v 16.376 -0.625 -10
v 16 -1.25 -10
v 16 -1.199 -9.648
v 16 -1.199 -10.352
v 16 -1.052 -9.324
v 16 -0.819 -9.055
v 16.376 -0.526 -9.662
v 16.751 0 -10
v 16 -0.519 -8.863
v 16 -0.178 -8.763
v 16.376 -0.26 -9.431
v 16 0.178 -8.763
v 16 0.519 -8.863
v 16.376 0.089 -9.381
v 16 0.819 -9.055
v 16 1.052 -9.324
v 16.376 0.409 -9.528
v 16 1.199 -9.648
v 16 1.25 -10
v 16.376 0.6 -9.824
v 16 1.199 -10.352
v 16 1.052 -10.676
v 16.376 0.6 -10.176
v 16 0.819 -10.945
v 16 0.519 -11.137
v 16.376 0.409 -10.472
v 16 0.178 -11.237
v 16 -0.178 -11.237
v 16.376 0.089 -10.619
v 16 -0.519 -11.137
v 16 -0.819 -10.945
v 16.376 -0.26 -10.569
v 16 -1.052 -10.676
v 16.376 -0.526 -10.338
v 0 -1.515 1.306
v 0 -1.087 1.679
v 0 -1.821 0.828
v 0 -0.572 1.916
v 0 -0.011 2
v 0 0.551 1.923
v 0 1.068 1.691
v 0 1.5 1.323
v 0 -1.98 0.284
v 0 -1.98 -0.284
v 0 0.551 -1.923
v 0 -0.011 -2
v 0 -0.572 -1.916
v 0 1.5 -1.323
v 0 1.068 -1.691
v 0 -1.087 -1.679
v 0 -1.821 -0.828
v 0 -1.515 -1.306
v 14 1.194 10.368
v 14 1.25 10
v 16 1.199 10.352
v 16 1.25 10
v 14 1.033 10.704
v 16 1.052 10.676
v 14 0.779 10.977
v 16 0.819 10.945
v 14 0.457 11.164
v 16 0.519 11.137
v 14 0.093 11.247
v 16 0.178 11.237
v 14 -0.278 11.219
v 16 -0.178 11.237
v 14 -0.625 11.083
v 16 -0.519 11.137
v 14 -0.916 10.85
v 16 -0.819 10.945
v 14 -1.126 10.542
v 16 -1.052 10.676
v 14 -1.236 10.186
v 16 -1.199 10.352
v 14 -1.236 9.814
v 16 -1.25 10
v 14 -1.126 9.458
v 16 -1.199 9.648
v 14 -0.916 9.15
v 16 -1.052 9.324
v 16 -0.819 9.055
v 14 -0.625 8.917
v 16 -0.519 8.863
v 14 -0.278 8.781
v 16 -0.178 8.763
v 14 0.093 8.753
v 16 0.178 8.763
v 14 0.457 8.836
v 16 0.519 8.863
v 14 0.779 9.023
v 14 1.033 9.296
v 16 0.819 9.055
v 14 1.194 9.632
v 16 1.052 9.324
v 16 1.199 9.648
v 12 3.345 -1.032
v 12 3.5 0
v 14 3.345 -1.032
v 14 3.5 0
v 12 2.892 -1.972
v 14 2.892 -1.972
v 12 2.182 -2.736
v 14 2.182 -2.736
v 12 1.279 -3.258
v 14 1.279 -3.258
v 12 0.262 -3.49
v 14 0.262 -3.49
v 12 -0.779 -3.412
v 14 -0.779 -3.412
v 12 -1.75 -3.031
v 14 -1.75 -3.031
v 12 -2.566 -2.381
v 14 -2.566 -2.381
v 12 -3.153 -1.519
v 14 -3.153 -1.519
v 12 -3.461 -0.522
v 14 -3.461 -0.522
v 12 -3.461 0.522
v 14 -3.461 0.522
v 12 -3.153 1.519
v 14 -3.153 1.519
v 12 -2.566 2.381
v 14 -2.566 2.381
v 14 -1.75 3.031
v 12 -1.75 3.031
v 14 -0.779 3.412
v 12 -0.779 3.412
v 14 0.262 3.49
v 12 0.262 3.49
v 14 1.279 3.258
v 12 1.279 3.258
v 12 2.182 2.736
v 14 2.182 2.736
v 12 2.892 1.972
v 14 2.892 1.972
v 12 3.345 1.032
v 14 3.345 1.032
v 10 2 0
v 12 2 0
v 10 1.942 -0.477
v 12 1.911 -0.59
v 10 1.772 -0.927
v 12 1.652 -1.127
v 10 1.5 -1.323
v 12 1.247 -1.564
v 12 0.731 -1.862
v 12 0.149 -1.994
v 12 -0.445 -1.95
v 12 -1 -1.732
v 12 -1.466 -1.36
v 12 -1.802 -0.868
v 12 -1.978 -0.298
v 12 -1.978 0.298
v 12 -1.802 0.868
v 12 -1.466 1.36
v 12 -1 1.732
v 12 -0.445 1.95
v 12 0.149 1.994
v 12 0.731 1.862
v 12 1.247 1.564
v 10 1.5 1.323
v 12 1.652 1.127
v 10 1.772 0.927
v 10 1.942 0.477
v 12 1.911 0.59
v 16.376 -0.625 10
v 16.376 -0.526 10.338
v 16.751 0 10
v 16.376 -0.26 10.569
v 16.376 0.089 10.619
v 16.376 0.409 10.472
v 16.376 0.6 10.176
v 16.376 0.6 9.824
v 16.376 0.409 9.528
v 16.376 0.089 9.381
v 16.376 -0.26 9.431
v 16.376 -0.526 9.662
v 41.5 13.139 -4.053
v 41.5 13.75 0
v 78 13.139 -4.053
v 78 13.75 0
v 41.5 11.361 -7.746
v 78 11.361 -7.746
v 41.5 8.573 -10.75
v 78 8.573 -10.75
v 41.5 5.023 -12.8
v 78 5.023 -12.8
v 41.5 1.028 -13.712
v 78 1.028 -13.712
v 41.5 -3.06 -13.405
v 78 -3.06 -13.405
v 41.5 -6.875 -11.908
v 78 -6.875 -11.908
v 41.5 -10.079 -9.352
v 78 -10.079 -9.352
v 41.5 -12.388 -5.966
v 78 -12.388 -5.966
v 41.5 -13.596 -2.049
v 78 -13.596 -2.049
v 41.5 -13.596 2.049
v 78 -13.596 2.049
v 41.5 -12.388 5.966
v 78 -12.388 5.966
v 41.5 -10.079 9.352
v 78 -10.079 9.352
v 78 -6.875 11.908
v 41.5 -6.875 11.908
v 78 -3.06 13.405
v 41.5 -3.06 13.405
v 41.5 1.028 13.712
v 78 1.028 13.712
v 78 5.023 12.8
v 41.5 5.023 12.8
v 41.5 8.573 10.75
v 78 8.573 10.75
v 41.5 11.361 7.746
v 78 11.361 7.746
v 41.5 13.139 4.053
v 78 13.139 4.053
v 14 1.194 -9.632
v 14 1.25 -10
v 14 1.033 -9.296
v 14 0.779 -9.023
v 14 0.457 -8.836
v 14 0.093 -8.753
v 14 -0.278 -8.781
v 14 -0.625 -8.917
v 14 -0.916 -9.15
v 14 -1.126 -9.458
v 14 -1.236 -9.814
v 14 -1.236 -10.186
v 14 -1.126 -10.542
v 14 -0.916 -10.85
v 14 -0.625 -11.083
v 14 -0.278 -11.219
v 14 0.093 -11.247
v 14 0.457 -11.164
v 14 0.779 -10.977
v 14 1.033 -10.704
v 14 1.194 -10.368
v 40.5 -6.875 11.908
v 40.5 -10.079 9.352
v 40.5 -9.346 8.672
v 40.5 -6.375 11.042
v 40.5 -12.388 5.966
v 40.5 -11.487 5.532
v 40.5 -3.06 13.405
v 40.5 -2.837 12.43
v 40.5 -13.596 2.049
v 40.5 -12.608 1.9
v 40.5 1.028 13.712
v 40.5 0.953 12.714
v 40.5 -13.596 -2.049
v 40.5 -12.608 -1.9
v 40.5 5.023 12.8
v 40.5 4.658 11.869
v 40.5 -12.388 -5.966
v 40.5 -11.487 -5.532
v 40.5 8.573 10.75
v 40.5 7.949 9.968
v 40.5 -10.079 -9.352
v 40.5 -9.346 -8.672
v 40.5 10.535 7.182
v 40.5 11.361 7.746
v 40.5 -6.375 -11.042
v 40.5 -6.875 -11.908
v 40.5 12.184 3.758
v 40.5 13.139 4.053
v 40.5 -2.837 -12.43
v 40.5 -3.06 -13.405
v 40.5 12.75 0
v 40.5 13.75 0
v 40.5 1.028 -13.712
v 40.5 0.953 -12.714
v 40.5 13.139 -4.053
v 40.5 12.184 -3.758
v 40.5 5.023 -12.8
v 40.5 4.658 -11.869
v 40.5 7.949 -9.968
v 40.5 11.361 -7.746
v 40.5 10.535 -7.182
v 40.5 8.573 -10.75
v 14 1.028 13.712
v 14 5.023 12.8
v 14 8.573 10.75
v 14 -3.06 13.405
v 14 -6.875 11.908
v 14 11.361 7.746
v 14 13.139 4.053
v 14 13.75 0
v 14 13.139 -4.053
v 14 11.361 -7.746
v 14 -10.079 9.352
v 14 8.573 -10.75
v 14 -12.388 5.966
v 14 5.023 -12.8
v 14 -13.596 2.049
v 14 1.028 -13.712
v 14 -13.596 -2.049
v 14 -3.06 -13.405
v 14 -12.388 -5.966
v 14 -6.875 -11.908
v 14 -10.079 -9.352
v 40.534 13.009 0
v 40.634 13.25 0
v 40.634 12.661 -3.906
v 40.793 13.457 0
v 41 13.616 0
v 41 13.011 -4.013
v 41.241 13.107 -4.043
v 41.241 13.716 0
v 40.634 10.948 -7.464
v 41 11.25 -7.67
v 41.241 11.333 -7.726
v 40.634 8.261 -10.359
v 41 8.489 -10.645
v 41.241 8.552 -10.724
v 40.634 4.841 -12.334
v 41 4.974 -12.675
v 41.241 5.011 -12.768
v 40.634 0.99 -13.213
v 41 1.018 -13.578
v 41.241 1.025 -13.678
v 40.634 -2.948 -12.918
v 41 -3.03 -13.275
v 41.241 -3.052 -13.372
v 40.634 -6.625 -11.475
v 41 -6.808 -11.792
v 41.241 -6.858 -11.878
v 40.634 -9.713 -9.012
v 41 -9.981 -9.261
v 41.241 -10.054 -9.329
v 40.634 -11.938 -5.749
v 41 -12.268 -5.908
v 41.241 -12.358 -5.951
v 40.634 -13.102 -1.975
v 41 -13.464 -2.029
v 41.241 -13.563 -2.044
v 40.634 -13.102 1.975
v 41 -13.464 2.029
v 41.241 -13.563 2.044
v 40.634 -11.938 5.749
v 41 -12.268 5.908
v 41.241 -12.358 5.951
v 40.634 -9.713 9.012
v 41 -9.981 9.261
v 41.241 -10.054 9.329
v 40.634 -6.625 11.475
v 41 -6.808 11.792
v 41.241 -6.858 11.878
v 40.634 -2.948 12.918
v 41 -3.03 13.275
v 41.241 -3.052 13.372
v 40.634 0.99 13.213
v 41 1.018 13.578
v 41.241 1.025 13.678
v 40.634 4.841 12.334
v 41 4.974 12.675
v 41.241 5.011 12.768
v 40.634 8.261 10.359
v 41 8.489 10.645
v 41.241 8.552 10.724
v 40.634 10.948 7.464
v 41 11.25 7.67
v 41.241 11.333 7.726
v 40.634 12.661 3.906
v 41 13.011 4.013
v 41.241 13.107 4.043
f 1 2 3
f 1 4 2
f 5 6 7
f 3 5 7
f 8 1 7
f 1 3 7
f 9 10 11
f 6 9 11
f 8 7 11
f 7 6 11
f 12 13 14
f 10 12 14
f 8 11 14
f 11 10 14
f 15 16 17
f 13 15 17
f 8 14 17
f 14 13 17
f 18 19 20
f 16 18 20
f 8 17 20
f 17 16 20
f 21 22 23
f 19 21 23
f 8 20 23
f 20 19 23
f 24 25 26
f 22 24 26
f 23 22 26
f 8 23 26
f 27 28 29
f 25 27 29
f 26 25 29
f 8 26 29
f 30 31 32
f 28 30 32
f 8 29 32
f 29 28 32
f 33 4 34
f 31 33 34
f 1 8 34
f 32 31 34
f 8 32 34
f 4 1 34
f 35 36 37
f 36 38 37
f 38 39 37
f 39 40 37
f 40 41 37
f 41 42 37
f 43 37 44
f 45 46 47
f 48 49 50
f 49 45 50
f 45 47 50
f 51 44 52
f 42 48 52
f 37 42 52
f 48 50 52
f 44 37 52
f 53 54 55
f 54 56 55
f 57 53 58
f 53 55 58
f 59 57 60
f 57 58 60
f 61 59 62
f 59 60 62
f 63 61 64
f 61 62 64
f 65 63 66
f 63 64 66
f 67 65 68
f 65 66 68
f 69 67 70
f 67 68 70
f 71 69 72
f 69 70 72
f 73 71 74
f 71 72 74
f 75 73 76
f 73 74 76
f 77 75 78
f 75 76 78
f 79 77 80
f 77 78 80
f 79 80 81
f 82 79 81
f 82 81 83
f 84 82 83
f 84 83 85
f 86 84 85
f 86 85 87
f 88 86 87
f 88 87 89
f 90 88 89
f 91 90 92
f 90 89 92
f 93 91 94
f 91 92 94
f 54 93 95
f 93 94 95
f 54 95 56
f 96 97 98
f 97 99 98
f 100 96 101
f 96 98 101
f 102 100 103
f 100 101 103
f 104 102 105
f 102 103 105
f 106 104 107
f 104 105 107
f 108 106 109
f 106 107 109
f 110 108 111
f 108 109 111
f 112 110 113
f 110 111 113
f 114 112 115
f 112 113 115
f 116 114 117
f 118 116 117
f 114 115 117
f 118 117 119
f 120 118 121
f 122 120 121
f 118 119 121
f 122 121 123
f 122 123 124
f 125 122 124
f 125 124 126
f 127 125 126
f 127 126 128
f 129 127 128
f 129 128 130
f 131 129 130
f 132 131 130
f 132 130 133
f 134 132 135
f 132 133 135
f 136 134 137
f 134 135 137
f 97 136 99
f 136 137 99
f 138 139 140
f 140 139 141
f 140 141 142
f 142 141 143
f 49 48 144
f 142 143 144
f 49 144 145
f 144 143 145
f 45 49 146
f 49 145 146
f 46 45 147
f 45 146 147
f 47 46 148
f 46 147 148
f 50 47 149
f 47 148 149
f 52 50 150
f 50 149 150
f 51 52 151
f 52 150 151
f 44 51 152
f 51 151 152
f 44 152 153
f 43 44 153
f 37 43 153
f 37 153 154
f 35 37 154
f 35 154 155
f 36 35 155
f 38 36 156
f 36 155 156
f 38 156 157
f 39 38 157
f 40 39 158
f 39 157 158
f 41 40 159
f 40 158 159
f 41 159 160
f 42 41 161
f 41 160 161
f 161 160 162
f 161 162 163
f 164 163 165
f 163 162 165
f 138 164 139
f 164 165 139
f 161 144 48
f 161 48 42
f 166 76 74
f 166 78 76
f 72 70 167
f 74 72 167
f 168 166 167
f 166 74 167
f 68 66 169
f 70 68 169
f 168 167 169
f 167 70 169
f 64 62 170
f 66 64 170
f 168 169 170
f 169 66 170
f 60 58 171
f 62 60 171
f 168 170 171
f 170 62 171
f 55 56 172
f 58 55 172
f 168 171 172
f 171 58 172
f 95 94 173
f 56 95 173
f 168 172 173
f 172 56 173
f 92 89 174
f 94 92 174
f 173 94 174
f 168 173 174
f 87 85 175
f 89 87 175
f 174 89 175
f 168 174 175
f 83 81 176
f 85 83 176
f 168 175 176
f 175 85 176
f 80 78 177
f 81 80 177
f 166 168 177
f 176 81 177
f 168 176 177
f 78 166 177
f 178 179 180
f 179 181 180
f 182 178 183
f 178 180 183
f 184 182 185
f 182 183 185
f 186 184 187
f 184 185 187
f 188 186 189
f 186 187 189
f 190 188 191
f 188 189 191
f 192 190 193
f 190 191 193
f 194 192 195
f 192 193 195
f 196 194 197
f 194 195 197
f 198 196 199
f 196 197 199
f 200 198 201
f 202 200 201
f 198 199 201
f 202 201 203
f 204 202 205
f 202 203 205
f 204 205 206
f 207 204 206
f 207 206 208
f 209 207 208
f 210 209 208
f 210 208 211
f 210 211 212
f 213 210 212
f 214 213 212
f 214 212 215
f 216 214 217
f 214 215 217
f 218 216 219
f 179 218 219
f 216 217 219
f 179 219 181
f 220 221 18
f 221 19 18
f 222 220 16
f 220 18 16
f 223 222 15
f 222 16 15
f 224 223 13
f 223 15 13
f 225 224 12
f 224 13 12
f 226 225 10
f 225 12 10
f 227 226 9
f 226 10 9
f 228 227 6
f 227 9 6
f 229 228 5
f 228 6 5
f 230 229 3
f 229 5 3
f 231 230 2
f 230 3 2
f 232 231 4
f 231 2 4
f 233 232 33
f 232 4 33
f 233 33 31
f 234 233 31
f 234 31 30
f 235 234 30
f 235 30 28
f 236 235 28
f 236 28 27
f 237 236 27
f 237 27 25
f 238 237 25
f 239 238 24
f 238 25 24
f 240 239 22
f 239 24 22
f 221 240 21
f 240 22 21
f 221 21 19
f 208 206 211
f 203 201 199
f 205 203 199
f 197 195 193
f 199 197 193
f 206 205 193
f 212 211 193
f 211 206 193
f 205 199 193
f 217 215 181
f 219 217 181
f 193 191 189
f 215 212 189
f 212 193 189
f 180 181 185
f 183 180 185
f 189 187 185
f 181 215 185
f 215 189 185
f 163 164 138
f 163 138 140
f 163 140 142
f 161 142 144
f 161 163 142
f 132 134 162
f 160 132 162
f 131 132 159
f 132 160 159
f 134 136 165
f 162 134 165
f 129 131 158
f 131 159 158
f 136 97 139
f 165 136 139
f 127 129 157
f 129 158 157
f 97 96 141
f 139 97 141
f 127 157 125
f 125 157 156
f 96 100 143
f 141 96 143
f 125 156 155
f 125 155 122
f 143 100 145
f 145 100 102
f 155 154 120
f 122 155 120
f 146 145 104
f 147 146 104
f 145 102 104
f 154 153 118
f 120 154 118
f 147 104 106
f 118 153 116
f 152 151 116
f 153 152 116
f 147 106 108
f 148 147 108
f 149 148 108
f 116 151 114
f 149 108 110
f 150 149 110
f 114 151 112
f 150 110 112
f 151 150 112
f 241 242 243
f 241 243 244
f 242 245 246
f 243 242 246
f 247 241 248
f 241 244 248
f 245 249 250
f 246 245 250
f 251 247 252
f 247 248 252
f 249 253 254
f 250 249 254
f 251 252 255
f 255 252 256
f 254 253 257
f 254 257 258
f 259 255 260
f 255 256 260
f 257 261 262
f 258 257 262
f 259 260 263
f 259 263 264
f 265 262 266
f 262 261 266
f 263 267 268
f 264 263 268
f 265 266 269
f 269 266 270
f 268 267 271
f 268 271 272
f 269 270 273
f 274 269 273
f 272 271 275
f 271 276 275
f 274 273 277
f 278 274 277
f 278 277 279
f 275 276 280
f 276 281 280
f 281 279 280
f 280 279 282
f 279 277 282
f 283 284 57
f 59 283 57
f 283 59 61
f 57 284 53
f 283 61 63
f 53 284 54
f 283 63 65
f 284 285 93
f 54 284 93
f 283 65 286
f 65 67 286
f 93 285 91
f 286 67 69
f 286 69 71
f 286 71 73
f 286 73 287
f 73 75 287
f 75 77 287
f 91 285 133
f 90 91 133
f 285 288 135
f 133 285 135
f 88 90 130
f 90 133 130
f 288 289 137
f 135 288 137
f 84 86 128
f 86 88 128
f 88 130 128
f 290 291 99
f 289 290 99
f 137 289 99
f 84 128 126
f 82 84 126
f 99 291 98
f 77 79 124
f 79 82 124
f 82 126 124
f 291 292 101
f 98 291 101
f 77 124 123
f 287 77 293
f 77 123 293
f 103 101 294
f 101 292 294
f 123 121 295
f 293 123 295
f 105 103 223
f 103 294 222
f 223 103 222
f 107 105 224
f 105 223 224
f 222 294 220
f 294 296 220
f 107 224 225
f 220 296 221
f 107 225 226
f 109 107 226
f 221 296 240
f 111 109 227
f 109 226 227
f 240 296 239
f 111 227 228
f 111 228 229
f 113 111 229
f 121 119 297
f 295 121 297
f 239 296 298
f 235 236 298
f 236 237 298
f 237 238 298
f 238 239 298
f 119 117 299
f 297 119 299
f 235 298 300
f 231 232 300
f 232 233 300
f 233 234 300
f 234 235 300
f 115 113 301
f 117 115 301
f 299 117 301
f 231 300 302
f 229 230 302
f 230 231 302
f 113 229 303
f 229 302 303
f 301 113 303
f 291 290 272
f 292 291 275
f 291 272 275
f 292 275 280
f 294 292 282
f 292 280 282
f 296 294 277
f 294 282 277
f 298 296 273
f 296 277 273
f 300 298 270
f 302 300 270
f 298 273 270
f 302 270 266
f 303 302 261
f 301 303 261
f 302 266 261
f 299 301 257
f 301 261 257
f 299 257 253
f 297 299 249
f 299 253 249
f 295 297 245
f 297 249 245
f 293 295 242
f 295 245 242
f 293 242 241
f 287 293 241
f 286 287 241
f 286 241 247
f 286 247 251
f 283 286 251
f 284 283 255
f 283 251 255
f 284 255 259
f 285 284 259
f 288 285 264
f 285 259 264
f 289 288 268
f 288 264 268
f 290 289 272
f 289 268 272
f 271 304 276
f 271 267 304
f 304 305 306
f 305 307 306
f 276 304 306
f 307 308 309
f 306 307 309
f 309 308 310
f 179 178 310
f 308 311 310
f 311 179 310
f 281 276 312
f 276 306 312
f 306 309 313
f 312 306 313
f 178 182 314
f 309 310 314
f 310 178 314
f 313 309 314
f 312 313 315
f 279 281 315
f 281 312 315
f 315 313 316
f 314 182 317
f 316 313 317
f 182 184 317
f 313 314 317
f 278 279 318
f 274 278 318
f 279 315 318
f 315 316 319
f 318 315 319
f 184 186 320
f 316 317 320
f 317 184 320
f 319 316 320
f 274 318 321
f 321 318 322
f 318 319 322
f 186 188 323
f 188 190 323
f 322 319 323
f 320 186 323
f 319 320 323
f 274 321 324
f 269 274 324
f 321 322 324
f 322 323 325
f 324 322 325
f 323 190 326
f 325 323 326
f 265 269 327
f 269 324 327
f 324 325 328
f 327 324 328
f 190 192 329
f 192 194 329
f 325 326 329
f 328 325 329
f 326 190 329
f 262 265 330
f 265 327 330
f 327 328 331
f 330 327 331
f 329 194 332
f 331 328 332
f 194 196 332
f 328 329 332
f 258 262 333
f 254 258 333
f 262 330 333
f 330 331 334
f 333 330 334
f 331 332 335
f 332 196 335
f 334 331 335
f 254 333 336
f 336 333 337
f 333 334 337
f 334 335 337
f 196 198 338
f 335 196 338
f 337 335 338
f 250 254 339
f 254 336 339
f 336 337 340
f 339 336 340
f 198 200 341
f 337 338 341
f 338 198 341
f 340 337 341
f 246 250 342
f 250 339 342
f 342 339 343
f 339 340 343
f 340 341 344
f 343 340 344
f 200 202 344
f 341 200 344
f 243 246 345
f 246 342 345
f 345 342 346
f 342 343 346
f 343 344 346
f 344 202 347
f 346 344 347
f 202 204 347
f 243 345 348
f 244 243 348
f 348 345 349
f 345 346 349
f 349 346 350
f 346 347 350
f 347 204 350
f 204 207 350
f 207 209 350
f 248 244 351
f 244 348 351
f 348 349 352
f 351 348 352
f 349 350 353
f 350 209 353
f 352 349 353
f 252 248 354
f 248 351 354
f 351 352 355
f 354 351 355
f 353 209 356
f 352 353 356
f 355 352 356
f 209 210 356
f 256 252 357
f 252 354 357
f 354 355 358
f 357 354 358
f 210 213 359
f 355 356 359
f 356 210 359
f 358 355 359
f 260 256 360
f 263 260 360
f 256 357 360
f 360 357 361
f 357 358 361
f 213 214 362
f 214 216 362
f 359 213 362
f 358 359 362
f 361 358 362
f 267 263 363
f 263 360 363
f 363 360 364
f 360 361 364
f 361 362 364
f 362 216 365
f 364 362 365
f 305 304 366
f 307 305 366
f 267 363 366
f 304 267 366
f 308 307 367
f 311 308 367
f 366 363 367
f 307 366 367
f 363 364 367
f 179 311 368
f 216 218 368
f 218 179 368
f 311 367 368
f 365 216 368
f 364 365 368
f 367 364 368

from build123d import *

# Parameters (mm, degrees)
M3_TAPPED_HOLE1_D     = 2.5
M3_TAPPED_HOLE1_DEPTH = 2
M3_TAPPED_HOLE1_TIP   = 0.751075774
CUT_EXTRUDE1_START    = -10
CUT_EXTRUDE1_DEPTH    = 10


with BuildPart() as part:
    # Sketch1 → Revolve1 (revolve)
    with BuildSketch(Plane.XY):
        with BuildLine():
            Line((0, 0), (0, 2))
            Line((0, 2), (12, 2))
            Line((12, 2), (12, 3.5))
            Line((12, 3.5), (14, 3.5))
            Line((14, 3.5), (14, 13.75))
            Line((14, 13.75), (40.5, 13.75))
            Line((40.5, 13.75), (40.5, 12.75))
            ThreePointArc((40.5, 12.75), (40.792893219, 13.457106781), (41.5, 13.75))
            Line((41.5, 13.75), (78, 13.75))
            Line((78, 13.75), (78, 0))
            Line((78, 0), (0, 0))
        make_face()
    revolve(axis=Axis((78, 0, 0), (-1, 0, 0)))

    # M3 Tapped Hole1
    with Locations(Plane(origin=(14, 0, -10), x_dir=(0, -1, 0), z_dir=(-1, 0, 0))):
        with Locations((0, 0), (0, 20)):
            Hole(M3_TAPPED_HOLE1_D / 2, depth=M3_TAPPED_HOLE1_DEPTH)
            with Locations((0, 0, -(M3_TAPPED_HOLE1_DEPTH + M3_TAPPED_HOLE1_TIP / 2))):  # 118° drill point
                Cone(0, M3_TAPPED_HOLE1_D / 2, M3_TAPPED_HOLE1_TIP, mode=Mode.SUBTRACT)

    # Sketch4 → Cut-Extrude1 (cut)
    with BuildSketch(Plane.ZY.offset(CUT_EXTRUDE1_START)):
        with BuildLine():
            Line((-1.322875656, 1.5), (1.322875656, 1.5))
            ThreePointArc((1.322875656, 1.5), (0, 2), (-1.322875656, 1.5))
        make_face()
    extrude(amount=CUT_EXTRUDE1_DEPTH, mode=Mode.SUBTRACT)


solid = part.part
